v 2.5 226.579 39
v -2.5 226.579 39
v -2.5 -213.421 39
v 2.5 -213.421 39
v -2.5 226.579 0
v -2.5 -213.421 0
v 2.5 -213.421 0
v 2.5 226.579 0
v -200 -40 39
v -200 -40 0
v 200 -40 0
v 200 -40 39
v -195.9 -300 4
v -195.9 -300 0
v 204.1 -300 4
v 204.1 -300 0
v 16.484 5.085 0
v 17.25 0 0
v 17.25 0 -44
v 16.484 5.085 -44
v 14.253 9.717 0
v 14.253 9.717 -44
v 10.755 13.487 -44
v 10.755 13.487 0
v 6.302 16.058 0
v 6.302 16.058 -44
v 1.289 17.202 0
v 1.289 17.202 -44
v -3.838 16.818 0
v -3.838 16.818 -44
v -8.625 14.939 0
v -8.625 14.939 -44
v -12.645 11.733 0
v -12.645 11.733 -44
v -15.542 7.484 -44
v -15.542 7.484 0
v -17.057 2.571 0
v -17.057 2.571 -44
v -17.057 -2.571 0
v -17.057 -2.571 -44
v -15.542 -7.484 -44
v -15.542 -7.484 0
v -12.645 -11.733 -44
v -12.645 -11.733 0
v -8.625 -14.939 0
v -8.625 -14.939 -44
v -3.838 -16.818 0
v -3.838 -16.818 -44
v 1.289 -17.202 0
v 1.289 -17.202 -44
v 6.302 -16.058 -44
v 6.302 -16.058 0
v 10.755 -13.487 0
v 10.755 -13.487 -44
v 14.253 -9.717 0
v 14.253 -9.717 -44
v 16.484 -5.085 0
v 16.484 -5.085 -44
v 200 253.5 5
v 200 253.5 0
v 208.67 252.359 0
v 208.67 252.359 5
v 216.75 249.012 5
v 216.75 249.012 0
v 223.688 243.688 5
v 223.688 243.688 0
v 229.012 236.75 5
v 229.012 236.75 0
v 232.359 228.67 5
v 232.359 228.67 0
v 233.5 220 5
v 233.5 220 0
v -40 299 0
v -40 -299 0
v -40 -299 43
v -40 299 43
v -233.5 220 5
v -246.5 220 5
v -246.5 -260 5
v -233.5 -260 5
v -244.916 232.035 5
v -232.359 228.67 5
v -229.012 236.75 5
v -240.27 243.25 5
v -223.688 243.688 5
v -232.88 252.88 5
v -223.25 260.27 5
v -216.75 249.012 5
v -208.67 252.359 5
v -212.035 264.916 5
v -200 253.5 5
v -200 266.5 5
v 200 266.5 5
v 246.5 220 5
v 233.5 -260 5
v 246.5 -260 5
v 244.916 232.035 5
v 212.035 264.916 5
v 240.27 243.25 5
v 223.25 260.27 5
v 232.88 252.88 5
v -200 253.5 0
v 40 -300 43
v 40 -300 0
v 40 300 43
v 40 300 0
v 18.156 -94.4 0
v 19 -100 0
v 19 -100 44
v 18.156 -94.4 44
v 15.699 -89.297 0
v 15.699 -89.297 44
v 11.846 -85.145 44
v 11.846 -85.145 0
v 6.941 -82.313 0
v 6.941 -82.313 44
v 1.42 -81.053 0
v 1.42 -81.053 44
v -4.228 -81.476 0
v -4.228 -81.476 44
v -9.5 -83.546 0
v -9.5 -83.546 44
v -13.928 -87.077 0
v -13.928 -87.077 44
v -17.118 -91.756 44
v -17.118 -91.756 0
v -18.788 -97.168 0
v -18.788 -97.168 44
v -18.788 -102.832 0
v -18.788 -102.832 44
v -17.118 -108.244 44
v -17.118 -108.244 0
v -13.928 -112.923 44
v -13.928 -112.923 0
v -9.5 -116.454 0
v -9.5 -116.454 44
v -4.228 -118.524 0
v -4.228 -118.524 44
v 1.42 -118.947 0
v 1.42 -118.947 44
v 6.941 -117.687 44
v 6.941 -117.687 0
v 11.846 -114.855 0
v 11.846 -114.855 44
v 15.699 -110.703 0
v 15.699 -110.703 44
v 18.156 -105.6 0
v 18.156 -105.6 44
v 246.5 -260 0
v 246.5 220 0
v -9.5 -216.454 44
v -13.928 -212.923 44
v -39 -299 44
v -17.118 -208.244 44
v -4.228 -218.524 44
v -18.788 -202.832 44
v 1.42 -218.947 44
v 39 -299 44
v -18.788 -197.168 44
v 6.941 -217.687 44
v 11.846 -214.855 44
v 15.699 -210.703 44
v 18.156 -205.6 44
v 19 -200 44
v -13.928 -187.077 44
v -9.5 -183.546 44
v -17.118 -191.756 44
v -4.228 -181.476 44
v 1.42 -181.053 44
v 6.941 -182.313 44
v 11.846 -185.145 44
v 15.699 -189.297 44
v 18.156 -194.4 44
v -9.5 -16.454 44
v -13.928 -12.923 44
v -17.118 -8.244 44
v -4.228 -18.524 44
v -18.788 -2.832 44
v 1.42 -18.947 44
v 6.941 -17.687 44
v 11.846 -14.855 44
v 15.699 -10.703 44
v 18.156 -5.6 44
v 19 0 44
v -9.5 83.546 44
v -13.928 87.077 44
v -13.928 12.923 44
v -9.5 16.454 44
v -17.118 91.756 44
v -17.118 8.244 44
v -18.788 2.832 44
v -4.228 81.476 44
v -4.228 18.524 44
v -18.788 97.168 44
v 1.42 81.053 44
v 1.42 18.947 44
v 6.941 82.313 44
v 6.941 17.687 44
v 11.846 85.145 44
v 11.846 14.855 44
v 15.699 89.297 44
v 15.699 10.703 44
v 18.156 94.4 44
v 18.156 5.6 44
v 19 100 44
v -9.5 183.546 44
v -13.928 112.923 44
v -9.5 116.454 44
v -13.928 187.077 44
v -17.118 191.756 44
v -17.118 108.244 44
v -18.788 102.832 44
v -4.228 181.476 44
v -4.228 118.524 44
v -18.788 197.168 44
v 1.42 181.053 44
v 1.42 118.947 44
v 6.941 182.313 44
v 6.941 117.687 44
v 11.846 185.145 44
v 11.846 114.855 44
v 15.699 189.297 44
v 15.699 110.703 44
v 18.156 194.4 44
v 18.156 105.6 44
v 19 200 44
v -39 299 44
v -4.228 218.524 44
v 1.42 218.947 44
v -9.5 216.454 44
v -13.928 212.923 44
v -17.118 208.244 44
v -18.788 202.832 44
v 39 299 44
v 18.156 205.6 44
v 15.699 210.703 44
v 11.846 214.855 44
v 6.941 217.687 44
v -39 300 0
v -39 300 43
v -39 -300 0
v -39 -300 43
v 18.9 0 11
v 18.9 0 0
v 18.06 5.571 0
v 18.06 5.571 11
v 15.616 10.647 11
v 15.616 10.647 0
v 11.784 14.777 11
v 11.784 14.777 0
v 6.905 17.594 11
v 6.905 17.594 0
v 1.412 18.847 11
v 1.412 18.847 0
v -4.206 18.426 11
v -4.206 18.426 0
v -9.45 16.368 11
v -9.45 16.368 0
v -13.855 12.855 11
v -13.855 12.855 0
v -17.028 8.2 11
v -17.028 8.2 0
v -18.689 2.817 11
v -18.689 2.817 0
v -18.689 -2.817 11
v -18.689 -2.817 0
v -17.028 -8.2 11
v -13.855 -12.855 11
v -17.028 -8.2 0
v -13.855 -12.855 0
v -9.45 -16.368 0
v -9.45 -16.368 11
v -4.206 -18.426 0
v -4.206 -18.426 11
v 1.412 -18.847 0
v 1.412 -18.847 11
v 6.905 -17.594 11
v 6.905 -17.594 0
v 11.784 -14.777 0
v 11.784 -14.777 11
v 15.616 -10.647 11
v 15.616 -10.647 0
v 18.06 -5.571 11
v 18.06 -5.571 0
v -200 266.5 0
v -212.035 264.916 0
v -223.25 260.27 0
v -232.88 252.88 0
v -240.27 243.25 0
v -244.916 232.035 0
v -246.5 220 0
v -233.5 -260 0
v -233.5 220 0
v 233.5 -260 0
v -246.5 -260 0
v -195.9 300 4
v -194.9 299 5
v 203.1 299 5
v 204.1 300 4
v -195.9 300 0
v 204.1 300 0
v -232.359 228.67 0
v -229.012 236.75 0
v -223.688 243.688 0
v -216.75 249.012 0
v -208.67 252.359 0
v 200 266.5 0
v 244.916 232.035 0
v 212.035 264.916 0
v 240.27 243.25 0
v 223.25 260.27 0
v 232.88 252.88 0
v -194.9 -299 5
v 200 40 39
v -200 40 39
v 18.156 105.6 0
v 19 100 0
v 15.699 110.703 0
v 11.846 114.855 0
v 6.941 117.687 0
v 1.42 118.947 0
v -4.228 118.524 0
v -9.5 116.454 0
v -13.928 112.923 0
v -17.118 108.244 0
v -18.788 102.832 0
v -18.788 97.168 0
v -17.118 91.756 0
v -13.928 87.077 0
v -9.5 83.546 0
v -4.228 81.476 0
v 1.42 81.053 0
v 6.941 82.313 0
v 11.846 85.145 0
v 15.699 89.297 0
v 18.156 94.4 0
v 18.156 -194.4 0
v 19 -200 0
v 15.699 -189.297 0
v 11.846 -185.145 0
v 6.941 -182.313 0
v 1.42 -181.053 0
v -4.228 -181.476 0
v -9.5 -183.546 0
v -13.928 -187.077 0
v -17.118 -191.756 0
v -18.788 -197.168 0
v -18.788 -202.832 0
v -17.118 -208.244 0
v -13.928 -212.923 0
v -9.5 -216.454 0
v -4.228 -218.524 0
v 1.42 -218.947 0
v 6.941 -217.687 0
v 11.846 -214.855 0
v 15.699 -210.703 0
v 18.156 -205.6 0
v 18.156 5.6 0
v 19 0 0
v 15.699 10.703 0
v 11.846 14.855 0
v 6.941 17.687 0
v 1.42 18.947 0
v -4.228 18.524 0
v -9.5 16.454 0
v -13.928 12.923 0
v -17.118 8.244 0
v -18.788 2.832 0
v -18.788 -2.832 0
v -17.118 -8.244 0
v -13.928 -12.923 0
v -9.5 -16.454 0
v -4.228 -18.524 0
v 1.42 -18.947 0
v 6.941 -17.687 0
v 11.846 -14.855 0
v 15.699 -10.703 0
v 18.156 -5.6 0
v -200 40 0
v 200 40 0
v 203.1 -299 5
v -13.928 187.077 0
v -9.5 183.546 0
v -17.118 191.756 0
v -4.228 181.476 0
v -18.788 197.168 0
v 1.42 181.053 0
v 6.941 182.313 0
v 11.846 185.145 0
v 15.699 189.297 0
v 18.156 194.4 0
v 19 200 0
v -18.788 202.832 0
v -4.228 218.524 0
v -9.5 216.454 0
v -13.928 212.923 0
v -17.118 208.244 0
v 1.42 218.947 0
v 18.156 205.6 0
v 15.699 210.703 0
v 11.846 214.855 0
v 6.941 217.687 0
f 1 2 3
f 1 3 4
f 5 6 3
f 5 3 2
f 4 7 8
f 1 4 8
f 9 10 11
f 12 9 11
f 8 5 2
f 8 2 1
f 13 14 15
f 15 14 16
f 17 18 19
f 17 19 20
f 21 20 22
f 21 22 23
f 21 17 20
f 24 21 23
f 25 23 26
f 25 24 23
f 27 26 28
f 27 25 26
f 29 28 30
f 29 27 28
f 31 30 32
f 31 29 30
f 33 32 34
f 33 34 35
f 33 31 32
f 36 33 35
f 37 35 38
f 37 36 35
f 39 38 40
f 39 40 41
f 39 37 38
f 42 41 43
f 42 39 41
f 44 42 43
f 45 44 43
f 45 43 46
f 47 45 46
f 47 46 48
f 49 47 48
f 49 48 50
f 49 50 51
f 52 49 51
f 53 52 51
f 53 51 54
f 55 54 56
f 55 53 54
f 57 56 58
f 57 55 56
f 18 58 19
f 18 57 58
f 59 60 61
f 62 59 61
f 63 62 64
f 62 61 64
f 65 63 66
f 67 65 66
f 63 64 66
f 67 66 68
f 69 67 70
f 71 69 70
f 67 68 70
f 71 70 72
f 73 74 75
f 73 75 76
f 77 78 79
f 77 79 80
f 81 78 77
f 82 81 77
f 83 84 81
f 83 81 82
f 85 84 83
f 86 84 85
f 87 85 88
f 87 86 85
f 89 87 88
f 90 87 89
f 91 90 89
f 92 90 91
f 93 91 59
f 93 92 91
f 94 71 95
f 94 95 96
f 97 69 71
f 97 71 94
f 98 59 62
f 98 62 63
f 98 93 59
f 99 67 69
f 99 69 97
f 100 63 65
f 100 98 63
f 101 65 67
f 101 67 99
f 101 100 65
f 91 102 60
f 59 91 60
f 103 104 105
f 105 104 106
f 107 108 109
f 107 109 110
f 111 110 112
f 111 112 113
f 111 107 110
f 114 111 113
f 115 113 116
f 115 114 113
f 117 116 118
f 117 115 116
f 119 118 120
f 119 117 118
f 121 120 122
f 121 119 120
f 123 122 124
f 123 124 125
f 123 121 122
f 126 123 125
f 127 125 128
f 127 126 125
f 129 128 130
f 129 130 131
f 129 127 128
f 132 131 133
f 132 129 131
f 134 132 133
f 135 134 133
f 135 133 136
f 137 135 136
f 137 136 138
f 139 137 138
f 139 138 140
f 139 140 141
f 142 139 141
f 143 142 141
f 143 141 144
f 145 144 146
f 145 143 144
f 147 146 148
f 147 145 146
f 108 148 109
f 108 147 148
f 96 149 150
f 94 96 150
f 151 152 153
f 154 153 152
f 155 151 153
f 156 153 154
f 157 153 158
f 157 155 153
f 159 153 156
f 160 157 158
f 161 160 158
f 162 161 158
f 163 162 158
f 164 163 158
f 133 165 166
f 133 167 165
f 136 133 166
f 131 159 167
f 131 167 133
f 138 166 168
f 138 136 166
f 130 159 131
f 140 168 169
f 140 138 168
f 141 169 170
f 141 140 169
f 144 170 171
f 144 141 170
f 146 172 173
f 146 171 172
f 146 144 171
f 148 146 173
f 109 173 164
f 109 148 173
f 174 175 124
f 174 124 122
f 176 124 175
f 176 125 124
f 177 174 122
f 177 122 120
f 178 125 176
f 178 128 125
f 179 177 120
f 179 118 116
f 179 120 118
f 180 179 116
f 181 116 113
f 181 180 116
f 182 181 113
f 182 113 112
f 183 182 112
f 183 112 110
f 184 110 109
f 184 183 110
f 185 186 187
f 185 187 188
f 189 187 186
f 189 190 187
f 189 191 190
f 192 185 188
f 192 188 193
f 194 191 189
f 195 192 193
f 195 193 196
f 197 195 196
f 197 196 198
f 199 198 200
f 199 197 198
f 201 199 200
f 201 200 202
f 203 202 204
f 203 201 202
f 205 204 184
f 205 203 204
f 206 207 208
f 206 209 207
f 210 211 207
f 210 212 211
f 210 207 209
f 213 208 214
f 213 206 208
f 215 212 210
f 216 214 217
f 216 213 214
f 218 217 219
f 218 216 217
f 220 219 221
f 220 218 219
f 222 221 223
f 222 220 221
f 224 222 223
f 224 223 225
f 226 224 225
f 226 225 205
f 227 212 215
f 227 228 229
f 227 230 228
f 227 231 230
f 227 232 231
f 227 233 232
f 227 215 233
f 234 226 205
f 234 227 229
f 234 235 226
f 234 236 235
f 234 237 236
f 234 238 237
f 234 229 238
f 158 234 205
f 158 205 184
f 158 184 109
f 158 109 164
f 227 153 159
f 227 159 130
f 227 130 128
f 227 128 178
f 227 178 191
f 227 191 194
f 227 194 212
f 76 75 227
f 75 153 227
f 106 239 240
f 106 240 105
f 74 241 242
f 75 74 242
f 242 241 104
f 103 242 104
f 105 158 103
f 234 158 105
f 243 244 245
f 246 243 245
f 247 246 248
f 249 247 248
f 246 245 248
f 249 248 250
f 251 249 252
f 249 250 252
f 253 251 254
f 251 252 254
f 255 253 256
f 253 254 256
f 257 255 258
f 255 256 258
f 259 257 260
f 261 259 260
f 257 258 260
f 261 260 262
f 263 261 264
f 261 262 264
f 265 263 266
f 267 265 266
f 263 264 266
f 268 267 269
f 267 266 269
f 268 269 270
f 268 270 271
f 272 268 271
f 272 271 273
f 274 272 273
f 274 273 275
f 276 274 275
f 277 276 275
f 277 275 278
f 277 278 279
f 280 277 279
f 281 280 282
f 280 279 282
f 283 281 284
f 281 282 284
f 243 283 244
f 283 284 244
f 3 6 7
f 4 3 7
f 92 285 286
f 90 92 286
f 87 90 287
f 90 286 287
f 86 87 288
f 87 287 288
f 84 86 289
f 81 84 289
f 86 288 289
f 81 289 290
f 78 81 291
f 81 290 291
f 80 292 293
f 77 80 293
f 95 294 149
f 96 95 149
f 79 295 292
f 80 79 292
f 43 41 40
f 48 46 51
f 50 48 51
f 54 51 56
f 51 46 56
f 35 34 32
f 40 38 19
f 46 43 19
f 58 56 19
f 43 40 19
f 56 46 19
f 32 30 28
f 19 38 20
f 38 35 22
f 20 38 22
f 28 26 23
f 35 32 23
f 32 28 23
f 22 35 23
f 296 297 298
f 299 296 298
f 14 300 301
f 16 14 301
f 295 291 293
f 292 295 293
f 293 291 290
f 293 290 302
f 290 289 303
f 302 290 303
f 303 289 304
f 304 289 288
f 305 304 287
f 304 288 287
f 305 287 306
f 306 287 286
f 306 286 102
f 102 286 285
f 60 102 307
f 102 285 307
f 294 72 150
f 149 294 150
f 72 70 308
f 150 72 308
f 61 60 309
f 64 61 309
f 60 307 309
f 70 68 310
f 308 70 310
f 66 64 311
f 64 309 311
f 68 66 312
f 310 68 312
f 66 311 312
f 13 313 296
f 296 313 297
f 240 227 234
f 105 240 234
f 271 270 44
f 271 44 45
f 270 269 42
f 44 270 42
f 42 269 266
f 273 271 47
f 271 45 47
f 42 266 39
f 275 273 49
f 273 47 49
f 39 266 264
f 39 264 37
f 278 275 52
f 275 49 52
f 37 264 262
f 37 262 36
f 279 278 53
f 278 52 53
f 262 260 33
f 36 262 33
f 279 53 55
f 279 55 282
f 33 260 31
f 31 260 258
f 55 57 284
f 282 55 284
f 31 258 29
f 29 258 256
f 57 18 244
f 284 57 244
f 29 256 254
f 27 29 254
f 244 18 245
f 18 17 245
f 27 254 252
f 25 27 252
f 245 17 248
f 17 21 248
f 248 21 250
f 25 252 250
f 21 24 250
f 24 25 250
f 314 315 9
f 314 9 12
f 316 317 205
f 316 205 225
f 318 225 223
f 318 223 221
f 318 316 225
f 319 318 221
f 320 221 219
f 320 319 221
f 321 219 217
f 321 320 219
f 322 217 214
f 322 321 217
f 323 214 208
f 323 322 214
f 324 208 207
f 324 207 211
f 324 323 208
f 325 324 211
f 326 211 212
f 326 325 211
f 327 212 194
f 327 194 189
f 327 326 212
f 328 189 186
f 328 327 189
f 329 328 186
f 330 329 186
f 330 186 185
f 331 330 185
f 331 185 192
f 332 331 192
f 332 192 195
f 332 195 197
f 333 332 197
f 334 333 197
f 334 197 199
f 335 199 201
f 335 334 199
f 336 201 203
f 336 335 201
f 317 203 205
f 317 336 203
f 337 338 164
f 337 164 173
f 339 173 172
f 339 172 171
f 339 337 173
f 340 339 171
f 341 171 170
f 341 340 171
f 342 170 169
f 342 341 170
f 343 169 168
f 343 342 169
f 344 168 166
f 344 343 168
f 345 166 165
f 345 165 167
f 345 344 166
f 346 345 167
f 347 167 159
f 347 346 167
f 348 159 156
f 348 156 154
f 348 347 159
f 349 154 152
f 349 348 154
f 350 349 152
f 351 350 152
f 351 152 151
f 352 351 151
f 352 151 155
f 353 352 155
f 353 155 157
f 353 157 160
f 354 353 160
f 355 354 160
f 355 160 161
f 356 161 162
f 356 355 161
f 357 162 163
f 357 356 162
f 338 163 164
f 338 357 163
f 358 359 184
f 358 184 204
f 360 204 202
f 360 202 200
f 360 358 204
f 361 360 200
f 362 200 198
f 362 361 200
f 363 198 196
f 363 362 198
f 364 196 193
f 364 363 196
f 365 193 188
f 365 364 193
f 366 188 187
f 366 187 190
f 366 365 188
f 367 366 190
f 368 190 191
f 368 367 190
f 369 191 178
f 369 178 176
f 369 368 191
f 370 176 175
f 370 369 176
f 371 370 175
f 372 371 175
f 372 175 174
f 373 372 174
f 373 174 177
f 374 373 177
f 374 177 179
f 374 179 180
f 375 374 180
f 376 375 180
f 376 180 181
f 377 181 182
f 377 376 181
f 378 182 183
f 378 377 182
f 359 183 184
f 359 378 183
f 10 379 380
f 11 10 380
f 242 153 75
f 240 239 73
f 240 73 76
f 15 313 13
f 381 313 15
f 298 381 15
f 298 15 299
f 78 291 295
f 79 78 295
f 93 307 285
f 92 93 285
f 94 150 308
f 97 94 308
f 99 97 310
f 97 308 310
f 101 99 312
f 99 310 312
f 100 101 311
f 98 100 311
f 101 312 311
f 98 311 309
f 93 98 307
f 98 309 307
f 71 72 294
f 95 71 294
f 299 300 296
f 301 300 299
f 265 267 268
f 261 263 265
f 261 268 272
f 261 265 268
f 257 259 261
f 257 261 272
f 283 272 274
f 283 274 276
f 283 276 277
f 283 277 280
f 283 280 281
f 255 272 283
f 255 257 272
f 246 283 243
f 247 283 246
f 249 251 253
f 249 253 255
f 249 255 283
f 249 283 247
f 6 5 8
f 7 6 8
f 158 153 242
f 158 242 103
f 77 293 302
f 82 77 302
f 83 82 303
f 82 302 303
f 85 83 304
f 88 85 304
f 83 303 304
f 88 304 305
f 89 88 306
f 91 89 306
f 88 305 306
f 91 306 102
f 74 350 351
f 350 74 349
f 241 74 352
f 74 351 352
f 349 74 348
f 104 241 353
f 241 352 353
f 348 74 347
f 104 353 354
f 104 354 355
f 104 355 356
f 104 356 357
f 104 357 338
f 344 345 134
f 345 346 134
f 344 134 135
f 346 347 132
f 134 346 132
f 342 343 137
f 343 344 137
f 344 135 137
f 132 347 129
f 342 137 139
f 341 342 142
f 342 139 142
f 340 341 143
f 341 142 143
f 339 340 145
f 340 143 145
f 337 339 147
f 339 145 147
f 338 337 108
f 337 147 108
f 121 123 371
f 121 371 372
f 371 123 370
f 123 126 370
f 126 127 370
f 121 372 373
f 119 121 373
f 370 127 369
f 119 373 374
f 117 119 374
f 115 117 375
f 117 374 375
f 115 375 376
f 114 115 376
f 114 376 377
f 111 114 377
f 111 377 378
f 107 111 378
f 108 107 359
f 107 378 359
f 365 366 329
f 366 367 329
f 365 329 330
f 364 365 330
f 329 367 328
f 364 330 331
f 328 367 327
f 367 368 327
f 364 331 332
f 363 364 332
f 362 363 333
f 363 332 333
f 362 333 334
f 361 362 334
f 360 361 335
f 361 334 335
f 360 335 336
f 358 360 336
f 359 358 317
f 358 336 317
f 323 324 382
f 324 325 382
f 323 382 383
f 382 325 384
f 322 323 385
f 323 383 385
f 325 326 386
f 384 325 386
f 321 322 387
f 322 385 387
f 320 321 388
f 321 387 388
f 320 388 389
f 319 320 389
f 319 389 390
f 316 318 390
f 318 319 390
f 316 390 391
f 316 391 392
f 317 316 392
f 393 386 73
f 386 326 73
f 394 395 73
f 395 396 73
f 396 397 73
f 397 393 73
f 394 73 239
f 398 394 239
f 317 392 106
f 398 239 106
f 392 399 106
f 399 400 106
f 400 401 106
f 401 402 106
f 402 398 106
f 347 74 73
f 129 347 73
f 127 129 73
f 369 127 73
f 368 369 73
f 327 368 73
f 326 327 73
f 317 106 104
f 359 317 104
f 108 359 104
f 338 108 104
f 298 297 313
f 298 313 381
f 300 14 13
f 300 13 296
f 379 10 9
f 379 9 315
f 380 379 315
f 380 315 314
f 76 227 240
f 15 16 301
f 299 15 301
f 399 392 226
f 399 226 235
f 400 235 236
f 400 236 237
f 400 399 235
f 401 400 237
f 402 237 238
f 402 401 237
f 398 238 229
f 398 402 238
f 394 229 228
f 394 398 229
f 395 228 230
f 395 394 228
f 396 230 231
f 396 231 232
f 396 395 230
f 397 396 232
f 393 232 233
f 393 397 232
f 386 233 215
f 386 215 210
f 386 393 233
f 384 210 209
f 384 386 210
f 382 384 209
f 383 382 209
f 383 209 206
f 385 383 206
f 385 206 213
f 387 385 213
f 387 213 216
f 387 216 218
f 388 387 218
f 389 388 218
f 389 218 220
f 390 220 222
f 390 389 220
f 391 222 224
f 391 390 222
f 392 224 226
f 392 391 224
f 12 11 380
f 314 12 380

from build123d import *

# Parameters (mm, degrees)
F0_W      = 80
F0_H      = 600
F0_R      = 19
F1_DEPTH  = 44
F2_W      = 400
F2_H      = 80
F3_DEPTH  = 39
F4_W      = 400
F4_H      = 600
F5_DEPTH  = 5
F6_W      = 5
F6_H      = 440
F7_DEPTH  = 39
F8_R      = 17.25
F9_DEPTH  = 44
F8_R_2    = 18.9
F10_DEPTH = 11
F12_DEPTH = 5
F13_SIZE  = 1
F14_SIZE  = 1


with BuildPart() as f1:
    # F0 (on Top) → F1 (new body)
    with BuildSketch(Plane.XY):
        Rectangle(F0_W, F0_H)
        with Locations((0, -200)):
            Circle(F0_R, mode=Mode.SUBTRACT)
        with Locations((0, -100)):
            Circle(F0_R, mode=Mode.SUBTRACT)
        Circle(F0_R, mode=Mode.SUBTRACT)
        with Locations((0, 100)):
            Circle(F0_R, mode=Mode.SUBTRACT)
        with Locations((0, 200)):
            Circle(F0_R, mode=Mode.SUBTRACT)
    extrude(amount=F1_DEPTH)

    # F13
    f13_edges = [f1.edges().sort_by_distance(p)[0] for p in [
        (40, 0, 44),
        (-40, 0, 44),
        (0, -300, 44),
        (0, 300, 44),
        (-40, -300, 22),
        (-40, 300, 22),
    ]]
    chamfer(f13_edges, length=F13_SIZE)


with BuildPart() as f3:
    # F2 (on Top) → F3 (new body)
    with BuildSketch(Plane.XY):
        Rectangle(F2_W, F2_H)
    extrude(amount=F3_DEPTH)


with BuildPart() as f5:
    # F4 (on Top) → F5 (new body)
    with BuildSketch(Plane.XY):
        with Locations((4.1000186466, 0)):
            Rectangle(F4_W, F4_H)
    extrude(amount=F5_DEPTH)

    # F14
    f14_edges = [f5.edges().sort_by_distance(p)[0] for p in [
        (-195.899981, 0, 5),
        (4.100019, -300, 5),
        (204.100019, 0, 5),
        (4.100019, 300, 5),
    ]]
    chamfer(f14_edges, length=F14_SIZE)


with BuildPart() as f7:
    # F6 (on Top) → F7 (new body)
    with BuildSketch(Plane.XY):
        with Locations((0, 6.5792605616)):
            Rectangle(F6_W, F6_H)
    extrude(amount=F7_DEPTH)


with BuildPart() as f9:
    # F8 (on Top) → F9 (new body)
    with BuildSketch(Plane.XY):
        Circle(F8_R)
    extrude(amount=-F9_DEPTH)

    # F8 (on Top) → F10 (join)
    with BuildSketch(Plane.XY):
        Circle(F8_R_2)
        Circle(F8_R, mode=Mode.SUBTRACT)
        Circle(F8_R)
    extrude(amount=F10_DEPTH)


with BuildPart() as f12:
    # F11 (on Top) → F12 (new body)
    with BuildSketch(Plane.XY):
        with BuildLine():
            Line((-200, 260), (200, 260))
            ThreePointArc((200, 260), (228.2842712475, 248.2842712475), (240, 220))
            Line((240, 220), (240, -260))
            Line((240, -260), (246.5, -260))
            Line((246.5, -260), (246.5, 220))
            ThreePointArc((246.5, 220), (232.8804653252, 252.8804653252), (200, 266.5))
            Line((200, 266.5), (-200, 266.5))
            ThreePointArc((-200, 266.5), (-232.8804653252, 252.8804653252), (-246.5, 220))
            Line((-246.5, 220), (-246.5, -260))
            Line((-246.5, -260), (-240, -260))
            Line((-240, -260), (-240, 220))
            ThreePointArc((-240, 220), (-228.2842712475, 248.2842712475), (-200, 260))
        make_face()
        with BuildLine():
            ThreePointArc((240, 220), (228.2842712475, 248.2842712475), (200, 260))
            Line((200, 260), (-200, 260))
            ThreePointArc((-200, 260), (-228.2842712475, 248.2842712475), (-240, 220))
            Line((-240, 220), (-240, -260))
            Line((-240, -260), (-233.5, -260))
            Line((-233.5, -260), (-233.5, 220))
            ThreePointArc((-233.5, 220), (-223.6880771697, 243.6880771697), (-200, 253.5))
            Line((-200, 253.5), (200, 253.5))
            ThreePointArc((200, 253.5), (223.6880771697, 243.6880771697), (233.5, 220))
            Line((233.5, 220), (233.5, -260))
            Line((233.5, -260), (240, -260))
            Line((240, -260), (240, 220))
        make_face()
    extrude(amount=F12_DEPTH)


solid = Compound([f1.part, f3.part, f5.part, f7.part, f9.part, f12.part])
